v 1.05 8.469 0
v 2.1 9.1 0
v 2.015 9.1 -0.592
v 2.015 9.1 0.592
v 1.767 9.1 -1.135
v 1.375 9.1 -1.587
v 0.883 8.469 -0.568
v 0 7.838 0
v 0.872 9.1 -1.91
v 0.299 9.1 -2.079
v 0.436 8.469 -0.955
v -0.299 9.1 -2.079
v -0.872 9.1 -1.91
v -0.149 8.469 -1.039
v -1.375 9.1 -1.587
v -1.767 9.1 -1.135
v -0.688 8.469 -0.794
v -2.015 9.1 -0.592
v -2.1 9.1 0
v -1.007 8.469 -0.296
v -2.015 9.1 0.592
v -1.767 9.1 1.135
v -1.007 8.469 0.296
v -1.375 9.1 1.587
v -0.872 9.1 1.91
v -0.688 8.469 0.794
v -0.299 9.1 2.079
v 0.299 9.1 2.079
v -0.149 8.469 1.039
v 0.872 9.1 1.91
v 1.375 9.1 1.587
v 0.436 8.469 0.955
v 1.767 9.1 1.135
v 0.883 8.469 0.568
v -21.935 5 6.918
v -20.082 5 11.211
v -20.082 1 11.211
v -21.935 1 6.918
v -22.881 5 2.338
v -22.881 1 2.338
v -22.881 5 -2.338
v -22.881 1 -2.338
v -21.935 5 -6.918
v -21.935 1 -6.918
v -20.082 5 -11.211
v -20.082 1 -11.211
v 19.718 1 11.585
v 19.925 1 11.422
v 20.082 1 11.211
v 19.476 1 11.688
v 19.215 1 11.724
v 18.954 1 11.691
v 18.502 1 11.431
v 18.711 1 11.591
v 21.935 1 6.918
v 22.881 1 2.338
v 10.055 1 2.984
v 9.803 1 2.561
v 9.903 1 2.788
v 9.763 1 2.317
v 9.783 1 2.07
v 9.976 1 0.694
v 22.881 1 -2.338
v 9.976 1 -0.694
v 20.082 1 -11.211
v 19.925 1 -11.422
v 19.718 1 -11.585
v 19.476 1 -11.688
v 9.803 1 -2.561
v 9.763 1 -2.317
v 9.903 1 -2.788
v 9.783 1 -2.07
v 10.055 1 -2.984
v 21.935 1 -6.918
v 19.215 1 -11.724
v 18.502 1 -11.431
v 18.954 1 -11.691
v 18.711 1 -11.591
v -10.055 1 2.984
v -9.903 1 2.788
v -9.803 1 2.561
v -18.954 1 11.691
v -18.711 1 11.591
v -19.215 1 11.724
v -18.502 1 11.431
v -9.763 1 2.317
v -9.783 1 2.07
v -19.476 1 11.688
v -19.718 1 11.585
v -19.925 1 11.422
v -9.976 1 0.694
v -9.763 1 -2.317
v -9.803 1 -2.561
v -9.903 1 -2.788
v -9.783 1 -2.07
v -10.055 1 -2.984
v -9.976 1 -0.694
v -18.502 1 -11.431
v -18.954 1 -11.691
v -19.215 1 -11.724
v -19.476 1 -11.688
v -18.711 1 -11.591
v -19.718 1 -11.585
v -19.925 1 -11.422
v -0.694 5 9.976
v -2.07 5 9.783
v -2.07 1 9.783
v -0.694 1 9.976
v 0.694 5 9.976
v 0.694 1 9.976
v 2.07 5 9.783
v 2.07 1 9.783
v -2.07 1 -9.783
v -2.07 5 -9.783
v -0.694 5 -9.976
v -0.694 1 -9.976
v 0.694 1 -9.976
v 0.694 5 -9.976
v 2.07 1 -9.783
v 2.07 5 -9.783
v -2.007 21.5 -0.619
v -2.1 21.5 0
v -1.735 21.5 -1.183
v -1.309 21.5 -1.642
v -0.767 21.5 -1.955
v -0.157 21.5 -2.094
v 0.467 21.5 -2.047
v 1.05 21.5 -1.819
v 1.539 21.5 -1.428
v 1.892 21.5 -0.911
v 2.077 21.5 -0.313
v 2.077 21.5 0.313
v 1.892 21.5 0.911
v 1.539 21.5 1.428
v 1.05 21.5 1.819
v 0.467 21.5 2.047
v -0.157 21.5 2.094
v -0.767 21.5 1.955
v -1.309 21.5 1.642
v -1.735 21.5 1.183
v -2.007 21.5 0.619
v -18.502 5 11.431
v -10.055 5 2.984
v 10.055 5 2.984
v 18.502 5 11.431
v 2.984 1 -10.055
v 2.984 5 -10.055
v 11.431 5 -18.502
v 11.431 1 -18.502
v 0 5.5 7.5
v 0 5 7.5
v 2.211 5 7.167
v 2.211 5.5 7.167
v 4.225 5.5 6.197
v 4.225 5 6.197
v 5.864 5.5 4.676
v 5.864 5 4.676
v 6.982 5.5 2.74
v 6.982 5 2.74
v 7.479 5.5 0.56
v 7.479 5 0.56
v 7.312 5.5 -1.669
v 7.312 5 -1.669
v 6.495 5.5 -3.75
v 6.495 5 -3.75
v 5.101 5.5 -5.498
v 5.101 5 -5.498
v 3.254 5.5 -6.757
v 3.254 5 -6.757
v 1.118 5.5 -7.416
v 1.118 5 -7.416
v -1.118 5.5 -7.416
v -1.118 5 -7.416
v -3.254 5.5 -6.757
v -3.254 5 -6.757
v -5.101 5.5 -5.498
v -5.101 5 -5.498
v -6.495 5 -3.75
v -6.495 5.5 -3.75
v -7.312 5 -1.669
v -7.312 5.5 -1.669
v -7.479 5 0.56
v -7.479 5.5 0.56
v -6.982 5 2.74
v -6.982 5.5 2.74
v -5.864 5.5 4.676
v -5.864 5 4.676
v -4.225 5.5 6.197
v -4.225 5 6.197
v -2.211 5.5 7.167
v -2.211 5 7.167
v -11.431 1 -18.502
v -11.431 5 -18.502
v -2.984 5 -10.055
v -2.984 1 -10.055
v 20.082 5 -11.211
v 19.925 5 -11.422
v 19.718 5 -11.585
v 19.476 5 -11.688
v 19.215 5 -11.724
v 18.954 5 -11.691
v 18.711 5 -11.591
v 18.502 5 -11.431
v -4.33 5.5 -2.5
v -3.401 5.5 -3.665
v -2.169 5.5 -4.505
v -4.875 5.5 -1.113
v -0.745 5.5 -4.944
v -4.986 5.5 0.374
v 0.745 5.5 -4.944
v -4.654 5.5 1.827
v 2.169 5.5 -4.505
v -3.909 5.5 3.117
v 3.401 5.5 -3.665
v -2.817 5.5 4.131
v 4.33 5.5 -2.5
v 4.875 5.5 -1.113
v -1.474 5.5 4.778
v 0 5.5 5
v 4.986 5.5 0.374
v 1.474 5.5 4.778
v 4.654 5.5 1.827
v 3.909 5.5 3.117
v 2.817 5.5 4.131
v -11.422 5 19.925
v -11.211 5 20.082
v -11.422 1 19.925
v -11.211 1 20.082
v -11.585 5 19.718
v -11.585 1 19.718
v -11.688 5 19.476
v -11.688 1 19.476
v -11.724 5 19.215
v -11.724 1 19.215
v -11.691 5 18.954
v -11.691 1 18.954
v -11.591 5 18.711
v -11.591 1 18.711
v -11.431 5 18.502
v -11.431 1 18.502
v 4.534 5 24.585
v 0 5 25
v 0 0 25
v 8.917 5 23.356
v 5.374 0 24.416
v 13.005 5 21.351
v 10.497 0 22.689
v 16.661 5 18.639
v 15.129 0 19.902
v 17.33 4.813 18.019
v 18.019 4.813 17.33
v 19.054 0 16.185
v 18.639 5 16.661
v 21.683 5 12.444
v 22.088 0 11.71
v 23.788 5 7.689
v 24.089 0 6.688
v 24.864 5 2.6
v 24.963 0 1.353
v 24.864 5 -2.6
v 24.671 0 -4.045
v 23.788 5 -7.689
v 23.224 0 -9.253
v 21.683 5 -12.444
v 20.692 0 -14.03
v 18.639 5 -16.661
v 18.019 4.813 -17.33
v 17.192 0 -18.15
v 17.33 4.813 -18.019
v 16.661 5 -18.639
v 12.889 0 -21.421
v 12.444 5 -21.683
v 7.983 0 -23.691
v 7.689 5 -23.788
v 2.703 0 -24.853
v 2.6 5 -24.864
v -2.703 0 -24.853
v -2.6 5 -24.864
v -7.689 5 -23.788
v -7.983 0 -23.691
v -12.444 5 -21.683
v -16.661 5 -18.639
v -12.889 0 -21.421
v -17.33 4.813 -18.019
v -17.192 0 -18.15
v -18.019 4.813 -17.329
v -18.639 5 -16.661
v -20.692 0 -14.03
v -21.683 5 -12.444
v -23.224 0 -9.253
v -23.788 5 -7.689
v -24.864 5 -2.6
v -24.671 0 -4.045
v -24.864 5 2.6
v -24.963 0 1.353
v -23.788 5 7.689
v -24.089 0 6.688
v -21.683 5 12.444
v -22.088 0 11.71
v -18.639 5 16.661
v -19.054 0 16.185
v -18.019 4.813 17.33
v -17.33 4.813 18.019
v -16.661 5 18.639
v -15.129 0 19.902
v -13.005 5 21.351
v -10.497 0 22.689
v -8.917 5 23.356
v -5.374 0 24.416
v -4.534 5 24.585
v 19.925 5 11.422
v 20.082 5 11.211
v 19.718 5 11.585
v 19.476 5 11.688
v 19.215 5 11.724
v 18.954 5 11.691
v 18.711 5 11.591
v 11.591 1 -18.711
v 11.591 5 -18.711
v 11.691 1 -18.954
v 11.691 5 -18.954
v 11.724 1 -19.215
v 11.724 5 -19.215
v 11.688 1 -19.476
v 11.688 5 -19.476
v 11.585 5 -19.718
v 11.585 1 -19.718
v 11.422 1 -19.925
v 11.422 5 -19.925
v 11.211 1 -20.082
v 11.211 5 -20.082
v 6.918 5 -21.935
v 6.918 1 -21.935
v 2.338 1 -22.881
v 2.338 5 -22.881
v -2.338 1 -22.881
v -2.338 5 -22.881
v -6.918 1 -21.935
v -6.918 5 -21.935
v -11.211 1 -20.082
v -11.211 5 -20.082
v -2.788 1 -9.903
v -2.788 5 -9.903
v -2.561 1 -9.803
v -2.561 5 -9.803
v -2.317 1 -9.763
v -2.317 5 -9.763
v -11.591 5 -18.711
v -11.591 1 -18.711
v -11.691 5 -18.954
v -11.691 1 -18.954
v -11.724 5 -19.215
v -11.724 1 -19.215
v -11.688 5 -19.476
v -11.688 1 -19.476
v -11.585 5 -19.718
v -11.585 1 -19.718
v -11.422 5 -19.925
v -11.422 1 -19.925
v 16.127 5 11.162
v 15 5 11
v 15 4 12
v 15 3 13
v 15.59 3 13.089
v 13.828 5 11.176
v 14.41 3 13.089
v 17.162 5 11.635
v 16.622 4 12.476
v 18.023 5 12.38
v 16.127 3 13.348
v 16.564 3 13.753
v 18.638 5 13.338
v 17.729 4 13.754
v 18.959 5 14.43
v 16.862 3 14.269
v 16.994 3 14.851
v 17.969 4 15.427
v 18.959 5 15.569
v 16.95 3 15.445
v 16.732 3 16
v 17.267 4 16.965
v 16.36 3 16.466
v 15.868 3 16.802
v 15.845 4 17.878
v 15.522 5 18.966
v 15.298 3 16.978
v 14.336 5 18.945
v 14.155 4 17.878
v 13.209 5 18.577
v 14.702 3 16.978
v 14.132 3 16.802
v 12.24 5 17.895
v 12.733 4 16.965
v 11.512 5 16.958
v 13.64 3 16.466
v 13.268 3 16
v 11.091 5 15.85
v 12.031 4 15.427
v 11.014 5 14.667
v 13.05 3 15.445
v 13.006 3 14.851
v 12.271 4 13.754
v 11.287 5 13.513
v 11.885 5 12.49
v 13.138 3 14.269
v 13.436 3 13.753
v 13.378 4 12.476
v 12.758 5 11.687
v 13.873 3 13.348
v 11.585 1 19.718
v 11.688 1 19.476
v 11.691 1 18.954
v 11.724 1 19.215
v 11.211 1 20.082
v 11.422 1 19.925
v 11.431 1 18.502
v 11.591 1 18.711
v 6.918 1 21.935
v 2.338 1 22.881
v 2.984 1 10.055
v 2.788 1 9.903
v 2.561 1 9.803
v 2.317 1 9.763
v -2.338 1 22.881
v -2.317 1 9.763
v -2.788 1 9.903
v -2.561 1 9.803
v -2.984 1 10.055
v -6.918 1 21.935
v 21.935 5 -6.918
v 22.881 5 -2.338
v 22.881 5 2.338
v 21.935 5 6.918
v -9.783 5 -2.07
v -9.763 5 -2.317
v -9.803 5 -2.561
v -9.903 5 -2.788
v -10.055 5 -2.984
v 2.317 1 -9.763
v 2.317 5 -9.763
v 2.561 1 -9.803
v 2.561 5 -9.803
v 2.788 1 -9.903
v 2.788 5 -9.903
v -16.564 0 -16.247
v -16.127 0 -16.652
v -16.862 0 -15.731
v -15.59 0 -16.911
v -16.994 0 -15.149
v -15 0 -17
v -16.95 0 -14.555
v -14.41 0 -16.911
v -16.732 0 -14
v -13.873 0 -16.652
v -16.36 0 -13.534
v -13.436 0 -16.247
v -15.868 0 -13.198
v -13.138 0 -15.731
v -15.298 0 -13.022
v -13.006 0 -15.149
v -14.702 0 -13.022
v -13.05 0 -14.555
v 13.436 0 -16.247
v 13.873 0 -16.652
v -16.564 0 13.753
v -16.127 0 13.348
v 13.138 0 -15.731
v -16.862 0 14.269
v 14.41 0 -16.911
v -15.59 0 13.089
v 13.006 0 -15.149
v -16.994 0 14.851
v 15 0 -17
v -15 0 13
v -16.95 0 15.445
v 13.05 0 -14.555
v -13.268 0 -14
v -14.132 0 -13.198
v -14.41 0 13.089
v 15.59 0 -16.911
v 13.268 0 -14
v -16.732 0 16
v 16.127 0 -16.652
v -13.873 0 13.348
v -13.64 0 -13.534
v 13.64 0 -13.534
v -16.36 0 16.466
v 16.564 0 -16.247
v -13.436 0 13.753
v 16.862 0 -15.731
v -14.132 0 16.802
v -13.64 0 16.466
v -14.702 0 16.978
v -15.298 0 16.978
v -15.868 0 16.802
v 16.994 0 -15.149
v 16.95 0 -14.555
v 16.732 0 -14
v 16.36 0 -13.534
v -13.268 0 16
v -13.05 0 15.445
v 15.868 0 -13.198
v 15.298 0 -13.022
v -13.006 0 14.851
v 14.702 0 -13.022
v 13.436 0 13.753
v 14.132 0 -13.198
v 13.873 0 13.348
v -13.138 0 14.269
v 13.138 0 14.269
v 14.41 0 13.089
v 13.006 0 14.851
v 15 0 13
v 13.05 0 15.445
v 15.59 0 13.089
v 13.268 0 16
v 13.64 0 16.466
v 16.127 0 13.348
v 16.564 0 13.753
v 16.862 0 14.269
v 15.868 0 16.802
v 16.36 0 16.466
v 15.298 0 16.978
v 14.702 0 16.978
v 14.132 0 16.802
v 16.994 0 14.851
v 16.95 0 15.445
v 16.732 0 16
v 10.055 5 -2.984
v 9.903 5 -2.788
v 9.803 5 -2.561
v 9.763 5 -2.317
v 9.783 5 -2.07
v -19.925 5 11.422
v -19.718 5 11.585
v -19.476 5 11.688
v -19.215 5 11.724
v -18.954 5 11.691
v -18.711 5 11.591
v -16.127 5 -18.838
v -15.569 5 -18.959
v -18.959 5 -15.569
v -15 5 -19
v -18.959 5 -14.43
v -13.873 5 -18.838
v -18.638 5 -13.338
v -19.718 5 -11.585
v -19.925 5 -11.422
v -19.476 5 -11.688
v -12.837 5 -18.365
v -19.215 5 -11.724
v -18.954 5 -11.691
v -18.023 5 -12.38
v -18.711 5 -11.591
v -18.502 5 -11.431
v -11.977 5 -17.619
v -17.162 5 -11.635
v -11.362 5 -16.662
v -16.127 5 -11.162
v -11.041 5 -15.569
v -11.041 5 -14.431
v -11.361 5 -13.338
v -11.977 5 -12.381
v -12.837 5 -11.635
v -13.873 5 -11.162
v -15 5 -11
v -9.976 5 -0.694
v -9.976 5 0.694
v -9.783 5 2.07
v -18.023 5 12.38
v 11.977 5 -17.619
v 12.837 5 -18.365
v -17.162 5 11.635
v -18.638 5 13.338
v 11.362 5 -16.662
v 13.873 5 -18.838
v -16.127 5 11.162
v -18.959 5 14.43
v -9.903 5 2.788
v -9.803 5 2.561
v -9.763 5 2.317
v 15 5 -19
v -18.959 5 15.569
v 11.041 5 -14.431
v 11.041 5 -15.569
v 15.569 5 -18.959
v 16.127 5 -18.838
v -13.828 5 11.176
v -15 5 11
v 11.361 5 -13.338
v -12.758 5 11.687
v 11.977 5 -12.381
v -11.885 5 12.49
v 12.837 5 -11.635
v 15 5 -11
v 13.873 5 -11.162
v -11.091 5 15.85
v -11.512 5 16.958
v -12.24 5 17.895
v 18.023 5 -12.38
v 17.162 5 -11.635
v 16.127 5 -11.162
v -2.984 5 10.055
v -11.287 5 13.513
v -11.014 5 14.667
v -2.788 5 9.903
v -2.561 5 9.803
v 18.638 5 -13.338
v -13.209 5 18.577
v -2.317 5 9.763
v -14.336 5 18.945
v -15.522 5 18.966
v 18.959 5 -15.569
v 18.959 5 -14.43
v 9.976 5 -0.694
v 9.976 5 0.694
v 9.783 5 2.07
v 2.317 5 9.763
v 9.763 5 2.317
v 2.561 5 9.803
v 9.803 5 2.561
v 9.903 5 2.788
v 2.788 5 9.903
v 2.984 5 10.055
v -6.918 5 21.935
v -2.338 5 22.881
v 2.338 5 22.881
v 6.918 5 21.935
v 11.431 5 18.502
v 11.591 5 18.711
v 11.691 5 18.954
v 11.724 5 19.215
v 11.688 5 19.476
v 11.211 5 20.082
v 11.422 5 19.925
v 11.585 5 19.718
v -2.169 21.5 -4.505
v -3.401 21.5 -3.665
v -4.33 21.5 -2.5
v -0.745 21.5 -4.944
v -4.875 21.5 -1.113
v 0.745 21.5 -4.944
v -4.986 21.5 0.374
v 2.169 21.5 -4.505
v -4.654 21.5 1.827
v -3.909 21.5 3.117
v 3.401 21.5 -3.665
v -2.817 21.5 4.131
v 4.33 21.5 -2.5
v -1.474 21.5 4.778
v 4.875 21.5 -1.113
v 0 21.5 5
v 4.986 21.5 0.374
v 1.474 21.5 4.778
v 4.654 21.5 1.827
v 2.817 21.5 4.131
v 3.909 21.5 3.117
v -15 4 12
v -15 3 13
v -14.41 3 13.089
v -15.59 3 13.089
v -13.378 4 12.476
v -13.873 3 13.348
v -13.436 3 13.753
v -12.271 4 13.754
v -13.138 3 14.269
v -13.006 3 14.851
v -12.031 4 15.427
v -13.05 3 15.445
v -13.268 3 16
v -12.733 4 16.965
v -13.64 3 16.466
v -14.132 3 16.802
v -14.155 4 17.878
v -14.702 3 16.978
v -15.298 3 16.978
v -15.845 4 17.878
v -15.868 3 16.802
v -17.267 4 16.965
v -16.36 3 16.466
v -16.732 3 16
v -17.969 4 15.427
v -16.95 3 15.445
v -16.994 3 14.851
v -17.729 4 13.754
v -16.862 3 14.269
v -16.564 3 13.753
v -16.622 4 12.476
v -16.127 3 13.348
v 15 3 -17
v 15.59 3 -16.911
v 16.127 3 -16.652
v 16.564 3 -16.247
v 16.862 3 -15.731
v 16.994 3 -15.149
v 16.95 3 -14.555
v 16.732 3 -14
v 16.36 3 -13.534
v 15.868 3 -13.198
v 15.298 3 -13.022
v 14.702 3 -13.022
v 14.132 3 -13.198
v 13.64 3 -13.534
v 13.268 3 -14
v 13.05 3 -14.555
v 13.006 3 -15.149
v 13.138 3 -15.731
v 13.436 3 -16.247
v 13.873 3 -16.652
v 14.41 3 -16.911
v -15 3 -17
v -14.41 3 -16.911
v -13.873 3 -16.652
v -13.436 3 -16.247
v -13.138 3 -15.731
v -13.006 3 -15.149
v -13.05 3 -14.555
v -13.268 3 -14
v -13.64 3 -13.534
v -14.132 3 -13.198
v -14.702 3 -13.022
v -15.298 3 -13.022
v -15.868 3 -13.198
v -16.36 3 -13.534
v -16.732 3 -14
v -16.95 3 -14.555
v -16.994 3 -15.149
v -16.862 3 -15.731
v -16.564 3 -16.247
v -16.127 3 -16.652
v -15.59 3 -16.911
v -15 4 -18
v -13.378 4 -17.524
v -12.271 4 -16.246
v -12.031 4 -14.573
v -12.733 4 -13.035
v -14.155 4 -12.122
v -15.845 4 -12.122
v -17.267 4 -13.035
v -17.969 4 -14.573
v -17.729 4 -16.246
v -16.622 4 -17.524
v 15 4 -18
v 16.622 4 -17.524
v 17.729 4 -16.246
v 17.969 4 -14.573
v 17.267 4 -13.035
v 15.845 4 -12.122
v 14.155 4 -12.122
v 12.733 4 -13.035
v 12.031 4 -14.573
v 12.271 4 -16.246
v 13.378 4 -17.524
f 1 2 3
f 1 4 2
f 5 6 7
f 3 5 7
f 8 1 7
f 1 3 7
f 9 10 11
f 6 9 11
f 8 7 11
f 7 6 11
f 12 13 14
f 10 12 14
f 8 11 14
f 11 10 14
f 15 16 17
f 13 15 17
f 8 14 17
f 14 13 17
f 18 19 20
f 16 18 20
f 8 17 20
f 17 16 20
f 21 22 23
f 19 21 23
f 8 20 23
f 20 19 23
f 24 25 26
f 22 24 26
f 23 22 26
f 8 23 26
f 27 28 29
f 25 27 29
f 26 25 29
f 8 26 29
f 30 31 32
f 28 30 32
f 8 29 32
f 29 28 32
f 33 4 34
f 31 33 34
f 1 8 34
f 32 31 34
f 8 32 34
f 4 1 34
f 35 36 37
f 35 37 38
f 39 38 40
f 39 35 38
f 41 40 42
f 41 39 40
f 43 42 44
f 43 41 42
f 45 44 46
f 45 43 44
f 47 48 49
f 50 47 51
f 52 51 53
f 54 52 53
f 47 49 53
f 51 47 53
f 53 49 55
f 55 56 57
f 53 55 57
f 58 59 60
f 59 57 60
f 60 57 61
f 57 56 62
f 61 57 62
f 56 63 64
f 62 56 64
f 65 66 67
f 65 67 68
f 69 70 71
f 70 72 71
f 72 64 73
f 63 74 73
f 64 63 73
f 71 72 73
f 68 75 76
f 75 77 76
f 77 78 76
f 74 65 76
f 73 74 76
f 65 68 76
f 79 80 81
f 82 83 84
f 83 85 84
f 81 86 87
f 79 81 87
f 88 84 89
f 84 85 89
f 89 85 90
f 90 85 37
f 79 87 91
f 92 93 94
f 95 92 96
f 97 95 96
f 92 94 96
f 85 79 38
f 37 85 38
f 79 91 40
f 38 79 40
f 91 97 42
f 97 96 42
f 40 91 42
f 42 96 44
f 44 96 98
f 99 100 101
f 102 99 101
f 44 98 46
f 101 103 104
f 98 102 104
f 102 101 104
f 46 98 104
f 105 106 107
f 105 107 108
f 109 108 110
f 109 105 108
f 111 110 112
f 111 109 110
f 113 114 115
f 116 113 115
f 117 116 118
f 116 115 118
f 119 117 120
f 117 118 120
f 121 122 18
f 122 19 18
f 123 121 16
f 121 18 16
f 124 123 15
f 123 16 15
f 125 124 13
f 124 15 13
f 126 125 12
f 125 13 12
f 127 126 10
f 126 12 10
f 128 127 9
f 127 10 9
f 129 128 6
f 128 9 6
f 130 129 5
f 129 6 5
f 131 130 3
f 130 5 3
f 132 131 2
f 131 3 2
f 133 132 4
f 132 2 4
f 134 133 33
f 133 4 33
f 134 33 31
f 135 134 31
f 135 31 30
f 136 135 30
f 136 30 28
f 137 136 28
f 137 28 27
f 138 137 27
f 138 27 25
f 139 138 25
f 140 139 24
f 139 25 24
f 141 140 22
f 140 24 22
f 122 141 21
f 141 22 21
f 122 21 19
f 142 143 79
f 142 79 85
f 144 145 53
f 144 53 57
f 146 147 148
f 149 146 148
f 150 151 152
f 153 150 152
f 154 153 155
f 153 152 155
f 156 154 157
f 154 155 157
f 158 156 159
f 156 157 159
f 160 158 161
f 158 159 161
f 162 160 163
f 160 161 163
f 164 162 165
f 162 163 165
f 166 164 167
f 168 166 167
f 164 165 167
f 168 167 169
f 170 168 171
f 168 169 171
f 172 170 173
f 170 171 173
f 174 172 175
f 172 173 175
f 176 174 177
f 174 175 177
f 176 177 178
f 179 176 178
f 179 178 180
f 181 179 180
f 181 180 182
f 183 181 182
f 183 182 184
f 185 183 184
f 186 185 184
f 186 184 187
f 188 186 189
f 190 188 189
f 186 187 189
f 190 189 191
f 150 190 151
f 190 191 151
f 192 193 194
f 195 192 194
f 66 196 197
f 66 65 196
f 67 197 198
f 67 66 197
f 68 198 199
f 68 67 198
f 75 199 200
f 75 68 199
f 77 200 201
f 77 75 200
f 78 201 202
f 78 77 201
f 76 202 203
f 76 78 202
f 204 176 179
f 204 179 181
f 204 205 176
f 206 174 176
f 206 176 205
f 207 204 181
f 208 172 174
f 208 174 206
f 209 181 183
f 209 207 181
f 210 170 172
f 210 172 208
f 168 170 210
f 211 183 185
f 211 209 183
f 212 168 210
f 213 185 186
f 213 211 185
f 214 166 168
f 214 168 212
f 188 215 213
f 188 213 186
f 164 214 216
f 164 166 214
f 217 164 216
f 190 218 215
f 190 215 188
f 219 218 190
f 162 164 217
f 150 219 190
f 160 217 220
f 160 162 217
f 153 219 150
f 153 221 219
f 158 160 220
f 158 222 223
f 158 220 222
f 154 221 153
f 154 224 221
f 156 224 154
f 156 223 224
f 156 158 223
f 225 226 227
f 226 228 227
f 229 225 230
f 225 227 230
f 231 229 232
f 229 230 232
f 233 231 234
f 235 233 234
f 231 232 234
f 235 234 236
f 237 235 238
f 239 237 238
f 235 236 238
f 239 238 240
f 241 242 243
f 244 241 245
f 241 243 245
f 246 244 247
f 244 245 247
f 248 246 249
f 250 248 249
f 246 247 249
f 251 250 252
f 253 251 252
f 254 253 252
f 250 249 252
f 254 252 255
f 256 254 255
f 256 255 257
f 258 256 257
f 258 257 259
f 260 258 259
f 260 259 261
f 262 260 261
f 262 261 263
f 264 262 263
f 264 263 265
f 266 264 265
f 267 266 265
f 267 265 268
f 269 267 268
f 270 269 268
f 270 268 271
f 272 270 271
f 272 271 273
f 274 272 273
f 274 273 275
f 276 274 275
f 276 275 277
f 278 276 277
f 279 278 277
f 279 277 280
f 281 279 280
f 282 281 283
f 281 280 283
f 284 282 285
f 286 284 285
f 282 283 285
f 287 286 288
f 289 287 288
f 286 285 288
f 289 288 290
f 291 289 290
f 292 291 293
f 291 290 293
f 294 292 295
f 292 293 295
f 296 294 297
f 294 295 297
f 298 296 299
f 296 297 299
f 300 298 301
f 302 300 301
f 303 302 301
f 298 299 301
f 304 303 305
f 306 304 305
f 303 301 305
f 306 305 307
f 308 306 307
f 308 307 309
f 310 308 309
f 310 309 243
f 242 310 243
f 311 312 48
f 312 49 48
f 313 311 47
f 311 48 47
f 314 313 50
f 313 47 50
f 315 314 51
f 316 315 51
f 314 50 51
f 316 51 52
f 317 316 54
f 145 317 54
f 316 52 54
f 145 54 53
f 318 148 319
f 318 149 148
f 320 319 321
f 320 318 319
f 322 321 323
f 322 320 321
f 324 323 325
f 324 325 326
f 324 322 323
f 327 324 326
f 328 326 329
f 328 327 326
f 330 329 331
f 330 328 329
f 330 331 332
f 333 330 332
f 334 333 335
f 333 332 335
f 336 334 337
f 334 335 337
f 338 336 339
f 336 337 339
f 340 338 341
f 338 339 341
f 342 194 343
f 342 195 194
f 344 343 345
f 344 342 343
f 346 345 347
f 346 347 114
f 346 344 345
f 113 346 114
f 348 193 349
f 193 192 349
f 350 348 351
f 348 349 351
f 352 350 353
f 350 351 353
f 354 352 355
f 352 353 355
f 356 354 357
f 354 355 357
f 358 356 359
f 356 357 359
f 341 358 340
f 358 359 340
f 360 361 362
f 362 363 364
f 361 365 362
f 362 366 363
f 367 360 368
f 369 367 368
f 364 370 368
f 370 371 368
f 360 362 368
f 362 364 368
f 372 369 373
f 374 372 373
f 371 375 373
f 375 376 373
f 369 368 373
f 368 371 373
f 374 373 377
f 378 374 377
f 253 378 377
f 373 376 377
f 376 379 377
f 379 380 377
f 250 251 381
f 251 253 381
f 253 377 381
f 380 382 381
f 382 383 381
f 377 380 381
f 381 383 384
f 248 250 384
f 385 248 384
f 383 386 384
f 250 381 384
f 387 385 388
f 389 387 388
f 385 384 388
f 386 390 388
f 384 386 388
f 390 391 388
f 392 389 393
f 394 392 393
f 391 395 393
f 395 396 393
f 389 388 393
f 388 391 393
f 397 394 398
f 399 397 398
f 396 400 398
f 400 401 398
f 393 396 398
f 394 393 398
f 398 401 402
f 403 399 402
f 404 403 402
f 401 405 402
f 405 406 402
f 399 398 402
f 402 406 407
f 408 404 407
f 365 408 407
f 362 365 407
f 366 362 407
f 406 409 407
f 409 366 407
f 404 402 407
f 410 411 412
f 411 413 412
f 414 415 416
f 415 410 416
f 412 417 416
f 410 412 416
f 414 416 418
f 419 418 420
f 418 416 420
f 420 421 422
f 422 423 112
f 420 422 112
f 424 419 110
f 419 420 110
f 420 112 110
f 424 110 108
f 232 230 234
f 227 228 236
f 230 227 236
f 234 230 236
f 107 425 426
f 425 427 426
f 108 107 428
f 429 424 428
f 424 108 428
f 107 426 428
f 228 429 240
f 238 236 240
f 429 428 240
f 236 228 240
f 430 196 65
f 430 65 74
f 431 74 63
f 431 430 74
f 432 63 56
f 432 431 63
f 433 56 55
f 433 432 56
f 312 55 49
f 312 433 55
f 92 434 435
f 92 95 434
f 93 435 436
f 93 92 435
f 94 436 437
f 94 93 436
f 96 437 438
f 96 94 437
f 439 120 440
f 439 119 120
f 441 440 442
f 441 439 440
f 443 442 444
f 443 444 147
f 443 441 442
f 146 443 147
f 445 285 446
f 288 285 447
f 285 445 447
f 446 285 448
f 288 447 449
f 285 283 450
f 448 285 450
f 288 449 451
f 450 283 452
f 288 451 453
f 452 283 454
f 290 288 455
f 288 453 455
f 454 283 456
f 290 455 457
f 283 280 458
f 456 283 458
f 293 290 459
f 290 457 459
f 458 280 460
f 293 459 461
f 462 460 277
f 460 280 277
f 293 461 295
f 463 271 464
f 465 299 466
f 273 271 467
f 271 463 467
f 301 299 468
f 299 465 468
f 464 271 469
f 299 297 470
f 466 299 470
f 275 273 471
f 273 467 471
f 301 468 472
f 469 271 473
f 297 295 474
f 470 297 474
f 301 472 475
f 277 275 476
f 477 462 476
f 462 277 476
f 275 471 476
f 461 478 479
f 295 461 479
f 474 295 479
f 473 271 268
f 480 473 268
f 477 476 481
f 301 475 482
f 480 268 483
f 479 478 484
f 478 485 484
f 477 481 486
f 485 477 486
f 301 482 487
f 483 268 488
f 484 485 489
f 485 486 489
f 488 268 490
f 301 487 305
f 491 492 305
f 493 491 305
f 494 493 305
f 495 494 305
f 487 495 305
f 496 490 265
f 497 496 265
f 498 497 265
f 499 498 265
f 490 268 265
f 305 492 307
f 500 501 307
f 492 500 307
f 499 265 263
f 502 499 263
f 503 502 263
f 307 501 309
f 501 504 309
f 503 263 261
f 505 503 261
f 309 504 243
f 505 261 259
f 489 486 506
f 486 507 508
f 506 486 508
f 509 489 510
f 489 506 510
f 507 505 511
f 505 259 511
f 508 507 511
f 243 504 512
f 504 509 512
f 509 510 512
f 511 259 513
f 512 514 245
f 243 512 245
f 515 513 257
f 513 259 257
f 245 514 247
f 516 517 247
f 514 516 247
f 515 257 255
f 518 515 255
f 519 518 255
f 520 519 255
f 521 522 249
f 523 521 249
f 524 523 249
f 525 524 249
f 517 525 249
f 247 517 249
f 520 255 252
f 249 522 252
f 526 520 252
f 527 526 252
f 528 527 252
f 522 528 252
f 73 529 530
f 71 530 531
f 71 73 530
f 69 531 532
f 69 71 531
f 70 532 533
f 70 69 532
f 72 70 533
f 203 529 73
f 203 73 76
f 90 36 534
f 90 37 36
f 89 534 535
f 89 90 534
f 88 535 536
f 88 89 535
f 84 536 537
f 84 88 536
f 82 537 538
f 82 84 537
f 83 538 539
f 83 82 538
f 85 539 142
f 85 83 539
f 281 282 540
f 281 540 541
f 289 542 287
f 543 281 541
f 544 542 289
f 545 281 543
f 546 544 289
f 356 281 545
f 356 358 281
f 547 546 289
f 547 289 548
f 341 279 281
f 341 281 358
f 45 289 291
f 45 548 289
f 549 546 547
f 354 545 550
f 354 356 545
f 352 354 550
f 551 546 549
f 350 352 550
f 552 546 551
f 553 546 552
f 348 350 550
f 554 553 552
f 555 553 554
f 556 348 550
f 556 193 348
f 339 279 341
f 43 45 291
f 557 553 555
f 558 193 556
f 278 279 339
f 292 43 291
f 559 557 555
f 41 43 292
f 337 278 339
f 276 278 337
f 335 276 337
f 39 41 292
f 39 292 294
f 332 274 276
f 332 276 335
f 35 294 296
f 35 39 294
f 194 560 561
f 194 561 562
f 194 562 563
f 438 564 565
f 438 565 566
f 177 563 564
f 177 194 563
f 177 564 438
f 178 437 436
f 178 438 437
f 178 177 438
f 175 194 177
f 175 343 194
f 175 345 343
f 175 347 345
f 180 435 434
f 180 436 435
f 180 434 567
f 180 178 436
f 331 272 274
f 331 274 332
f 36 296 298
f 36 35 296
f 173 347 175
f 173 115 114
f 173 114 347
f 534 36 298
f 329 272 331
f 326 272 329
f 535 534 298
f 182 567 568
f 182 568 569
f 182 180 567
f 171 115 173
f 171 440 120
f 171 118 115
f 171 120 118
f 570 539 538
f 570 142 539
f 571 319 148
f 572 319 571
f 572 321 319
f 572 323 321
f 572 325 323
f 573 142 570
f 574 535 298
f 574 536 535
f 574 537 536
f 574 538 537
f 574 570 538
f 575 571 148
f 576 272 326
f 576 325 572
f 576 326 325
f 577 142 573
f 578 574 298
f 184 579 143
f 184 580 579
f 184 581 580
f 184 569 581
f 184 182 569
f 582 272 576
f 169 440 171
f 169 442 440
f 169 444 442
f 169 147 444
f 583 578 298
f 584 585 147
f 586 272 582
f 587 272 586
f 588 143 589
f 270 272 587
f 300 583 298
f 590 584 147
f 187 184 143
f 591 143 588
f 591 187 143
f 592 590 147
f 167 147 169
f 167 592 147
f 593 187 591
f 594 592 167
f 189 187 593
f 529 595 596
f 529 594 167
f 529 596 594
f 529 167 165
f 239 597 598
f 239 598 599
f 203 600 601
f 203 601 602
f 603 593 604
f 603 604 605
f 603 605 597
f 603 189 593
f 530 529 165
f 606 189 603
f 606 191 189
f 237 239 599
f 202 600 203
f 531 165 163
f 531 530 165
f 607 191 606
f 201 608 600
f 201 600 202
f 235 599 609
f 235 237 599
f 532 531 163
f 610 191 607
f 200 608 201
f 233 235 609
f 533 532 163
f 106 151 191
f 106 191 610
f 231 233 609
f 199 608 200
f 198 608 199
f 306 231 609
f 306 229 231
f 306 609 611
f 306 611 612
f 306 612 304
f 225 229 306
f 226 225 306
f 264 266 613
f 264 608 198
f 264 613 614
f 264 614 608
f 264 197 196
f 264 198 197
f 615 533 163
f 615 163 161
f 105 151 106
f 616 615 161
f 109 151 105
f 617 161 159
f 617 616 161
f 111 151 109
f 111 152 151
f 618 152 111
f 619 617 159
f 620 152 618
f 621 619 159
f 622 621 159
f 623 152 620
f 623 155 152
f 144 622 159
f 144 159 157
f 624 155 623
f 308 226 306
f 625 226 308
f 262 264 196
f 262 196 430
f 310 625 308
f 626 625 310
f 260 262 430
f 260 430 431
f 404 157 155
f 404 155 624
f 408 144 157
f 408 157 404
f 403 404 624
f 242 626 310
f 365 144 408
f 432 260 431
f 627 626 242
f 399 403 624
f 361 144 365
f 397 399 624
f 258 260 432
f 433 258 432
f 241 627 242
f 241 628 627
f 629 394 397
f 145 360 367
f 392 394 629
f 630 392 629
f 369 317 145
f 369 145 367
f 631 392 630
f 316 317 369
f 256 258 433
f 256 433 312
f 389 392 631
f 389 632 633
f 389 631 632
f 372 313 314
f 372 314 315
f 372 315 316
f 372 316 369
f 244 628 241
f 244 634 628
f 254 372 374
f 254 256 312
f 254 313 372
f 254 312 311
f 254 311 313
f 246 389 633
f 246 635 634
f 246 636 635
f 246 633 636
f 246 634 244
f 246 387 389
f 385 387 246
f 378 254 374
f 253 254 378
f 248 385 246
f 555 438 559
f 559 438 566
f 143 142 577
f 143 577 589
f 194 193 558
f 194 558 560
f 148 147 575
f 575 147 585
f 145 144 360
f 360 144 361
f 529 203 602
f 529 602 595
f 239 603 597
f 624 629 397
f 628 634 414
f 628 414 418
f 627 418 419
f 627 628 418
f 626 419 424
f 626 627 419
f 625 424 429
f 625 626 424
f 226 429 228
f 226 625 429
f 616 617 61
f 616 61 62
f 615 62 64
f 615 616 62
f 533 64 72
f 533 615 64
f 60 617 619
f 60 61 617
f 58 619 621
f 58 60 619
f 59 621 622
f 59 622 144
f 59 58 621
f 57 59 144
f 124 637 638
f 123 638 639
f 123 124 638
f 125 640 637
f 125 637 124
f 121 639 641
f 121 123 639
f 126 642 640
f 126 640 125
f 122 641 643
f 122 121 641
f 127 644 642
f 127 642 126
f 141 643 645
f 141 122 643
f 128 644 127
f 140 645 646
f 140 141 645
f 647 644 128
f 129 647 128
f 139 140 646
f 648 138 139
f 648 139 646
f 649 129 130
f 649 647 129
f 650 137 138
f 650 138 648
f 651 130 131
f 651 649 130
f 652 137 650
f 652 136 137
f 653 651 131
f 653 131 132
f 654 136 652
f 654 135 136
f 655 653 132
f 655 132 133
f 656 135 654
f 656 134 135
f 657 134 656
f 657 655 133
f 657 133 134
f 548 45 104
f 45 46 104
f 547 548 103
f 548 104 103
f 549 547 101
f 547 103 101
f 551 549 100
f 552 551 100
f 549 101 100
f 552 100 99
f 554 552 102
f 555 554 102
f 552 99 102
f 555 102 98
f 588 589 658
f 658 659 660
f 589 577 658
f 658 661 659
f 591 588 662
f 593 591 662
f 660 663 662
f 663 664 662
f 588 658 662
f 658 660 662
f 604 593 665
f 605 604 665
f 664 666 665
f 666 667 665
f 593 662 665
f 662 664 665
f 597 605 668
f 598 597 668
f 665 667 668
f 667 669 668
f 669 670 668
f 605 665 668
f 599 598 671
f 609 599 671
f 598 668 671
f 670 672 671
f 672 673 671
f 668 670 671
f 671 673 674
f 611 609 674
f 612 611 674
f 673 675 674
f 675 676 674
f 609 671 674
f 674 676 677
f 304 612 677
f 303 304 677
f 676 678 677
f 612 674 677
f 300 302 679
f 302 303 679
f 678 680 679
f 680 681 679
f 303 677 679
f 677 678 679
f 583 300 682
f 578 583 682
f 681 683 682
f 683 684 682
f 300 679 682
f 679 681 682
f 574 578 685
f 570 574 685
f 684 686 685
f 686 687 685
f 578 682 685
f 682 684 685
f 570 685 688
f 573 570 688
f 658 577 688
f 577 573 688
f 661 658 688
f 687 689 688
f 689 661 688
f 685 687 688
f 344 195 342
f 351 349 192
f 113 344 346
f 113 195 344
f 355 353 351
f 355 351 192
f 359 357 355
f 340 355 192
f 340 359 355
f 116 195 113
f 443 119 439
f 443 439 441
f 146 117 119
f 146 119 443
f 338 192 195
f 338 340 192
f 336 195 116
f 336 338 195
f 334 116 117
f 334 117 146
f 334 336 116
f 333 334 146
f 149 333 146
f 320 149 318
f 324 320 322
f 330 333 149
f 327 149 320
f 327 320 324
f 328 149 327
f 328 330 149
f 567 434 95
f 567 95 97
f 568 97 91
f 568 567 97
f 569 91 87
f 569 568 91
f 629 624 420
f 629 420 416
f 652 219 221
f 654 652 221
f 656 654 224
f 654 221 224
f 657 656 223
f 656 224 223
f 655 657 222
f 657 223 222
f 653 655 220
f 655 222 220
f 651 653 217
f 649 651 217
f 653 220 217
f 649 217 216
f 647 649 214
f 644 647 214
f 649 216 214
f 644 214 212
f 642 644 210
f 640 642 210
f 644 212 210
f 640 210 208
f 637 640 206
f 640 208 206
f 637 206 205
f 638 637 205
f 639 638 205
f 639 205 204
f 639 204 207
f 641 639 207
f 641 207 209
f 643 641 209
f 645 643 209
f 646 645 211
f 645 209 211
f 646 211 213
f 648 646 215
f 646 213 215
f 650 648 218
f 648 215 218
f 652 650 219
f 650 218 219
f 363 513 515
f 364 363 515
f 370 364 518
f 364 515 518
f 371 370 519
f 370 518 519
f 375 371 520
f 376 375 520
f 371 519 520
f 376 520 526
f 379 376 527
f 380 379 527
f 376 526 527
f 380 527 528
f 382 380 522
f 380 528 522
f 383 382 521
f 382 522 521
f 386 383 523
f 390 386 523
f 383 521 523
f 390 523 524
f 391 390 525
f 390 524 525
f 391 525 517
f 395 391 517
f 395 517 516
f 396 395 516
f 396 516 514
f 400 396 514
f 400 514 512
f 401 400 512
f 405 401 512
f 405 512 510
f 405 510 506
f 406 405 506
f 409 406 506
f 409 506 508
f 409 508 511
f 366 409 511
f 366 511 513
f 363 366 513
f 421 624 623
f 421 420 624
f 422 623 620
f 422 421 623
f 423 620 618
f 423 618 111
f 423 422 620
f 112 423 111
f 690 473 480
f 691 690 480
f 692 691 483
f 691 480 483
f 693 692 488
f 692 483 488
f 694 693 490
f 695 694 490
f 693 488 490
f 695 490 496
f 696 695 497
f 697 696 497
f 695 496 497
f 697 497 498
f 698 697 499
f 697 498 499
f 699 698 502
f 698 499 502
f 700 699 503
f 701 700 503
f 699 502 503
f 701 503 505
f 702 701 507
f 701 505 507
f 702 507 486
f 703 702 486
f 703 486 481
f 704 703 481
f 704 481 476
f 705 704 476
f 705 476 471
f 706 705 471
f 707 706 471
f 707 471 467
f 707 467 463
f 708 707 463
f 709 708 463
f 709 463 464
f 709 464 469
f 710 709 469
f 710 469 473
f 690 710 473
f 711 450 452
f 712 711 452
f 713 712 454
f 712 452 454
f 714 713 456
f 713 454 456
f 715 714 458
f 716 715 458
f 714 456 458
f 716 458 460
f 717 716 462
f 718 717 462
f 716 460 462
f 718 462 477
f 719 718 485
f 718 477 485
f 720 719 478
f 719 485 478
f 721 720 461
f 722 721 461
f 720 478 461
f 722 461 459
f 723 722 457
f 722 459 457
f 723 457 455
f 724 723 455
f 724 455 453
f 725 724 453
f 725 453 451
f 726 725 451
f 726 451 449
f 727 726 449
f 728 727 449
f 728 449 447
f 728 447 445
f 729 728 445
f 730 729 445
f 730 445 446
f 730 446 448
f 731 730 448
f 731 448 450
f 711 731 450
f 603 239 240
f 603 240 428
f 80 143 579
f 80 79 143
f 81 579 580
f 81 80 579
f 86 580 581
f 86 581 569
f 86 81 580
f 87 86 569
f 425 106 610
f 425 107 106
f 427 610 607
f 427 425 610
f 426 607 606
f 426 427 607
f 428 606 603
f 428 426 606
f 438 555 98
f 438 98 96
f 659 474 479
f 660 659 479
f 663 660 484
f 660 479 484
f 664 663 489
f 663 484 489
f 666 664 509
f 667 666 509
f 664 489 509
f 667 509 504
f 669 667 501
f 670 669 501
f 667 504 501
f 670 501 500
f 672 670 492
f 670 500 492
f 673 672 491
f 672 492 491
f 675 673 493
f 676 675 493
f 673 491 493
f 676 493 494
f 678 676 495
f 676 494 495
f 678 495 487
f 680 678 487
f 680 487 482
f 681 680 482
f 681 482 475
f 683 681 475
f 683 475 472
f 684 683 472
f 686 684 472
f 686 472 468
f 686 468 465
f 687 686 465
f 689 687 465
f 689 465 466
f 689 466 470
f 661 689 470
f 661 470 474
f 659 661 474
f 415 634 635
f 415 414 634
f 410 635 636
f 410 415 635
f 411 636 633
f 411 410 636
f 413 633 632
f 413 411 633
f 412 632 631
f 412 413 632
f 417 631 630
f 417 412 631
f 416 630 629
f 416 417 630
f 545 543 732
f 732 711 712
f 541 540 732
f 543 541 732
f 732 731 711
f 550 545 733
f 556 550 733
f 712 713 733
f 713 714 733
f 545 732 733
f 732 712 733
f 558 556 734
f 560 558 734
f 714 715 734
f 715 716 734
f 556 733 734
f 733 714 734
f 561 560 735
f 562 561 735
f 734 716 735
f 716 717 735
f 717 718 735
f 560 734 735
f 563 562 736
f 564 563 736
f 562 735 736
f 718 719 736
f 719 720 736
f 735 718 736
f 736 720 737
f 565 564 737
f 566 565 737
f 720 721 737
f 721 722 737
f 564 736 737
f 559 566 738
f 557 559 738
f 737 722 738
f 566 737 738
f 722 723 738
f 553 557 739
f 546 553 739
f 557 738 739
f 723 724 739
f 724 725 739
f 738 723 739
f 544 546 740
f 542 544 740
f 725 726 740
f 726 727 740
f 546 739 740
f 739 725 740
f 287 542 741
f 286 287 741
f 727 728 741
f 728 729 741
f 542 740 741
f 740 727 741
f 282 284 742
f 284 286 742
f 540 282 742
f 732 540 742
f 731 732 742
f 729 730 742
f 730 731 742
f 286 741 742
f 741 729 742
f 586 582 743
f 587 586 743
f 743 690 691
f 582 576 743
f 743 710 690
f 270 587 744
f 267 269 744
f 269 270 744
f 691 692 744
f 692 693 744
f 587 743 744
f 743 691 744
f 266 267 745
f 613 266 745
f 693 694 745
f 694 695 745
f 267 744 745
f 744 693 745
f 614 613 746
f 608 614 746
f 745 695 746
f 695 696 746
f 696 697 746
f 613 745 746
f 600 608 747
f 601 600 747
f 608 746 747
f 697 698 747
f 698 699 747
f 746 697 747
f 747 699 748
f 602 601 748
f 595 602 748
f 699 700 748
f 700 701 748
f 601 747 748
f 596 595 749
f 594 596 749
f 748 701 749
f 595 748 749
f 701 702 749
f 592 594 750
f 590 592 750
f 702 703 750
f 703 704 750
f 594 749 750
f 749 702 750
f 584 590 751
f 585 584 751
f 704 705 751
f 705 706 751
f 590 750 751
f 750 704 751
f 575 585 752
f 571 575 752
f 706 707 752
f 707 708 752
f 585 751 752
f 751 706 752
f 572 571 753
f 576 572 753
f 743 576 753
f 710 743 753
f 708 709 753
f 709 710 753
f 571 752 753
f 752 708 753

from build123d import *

# Parameters (mm, degrees)
SKETCH_1_R             = 25
EXTRUDE_1_DEPTH        = 5
SKETCH_3_R             = 7.5
EXTRUDE_2_DEPTH        = 0.5
SKETCH_4_R             = 5
EXTRUDE_3_DEPTH        = 16
SKETCH_8_R             = 2
CUT_EXTRUDE_2_DEPTH    = 42.379342672
CHAMFER_1_SIZE         = 2
CUT_EXTRUDE_5_DEPTH    = 4
FILLET_1_R             = 1
HOLE_WIZARD_M5_1_D     = 4.2
HOLE_WIZARD_M5_1_DEPTH = 12.4
HOLE_WIZARD_M5_1_TIP   = 1.2618073


with BuildPart() as part:
    # 草图1 → 凸台-拉伸1 (new body)
    with BuildSketch(Plane(origin=(0, 0, 0), x_dir=(1, 0, 0), z_dir=(0, 1, 0))):
        with Locations(Location((0, 0, 0), (0, 0, 270))):
            Circle(SKETCH_1_R)
    extrude(amount=EXTRUDE_1_DEPTH)

    # 草图3 → 凸台-拉伸2 (add)
    with BuildSketch(Plane(origin=(0, 5, 0), x_dir=(1, 0, 0), z_dir=(0, 1, 0))):
        with Locations(Location((0, 0, 0), (0, 0, 270))):
            Circle(SKETCH_3_R)
    extrude(amount=EXTRUDE_2_DEPTH)

    # 草图4 → 凸台-拉伸3 (add)
    with BuildSketch(Plane(origin=(0, 5.5, 0), x_dir=(1, 0, 0), z_dir=(0, 1, 0))):
        with Locations(Location((0, 0, 0), (0, 0, 270))):
            Circle(SKETCH_4_R)
    extrude(amount=EXTRUDE_3_DEPTH)

    # 草图8 → 切除-拉伸2 (cut, through all)
    with BuildSketch(Plane(origin=(0, 0, 0), x_dir=(-1, 0, 0), z_dir=(0, -1, 0))):
        with Locations(Location((-15, -15, 0), (0, 0, 90))):
            Circle(SKETCH_8_R)
        with Locations(Location((15, -15, 0), (0, 0, 90))):
            Circle(SKETCH_8_R)
        with Locations(Location((15, 15, 0), (0, 0, 90))):
            Circle(SKETCH_8_R)
        with Locations(Location((-15, 15, 0), (0, 0, 90))):
            Circle(SKETCH_8_R)
    extrude(amount=-CUT_EXTRUDE_2_DEPTH, mode=Mode.SUBTRACT)

    # 倒角1
    # the kernel refuses this chamfer: 2 mm, written as the material it takes off along each edge
    with BuildSketch(Plane(origin=(15, 5, -15), x_dir=(0, 0, -1), z_dir=(-1, 0, 0))) as chamfer_1_piece_1:
        Polygon((2 + CHAMFER_1_SIZE, 0), (2, CHAMFER_1_SIZE), (2, 0), align=None)
    revolve(axis=Axis((15, 5, -15), (0, -1, 0)), mode=Mode.SUBTRACT)
    with BuildSketch(Plane(origin=(-15, 5, -15), x_dir=(0, 0, -1), z_dir=(-1, 0, 0))) as chamfer_1_piece_2:
        Polygon((2 + CHAMFER_1_SIZE, 0), (2, CHAMFER_1_SIZE), (2, 0), align=None)
    revolve(axis=Axis((-15, 5, -15), (0, -1, 0)), mode=Mode.SUBTRACT)
    with BuildSketch(Plane(origin=(-15, 5, 15), x_dir=(0, 0, -1), z_dir=(-1, 0, 0))) as chamfer_1_piece_3:
        Polygon((2 + CHAMFER_1_SIZE, 0), (2, CHAMFER_1_SIZE), (2, 0), align=None)
    revolve(axis=Axis((-15, 5, 15), (0, -1, 0)), mode=Mode.SUBTRACT)
    with BuildSketch(Plane(origin=(15, 5, 15), x_dir=(0, 0, -1), z_dir=(-1, 0, 0))) as chamfer_1_piece_4:
        Polygon((2 + CHAMFER_1_SIZE, 0), (2, CHAMFER_1_SIZE), (2, 0), align=None)
    revolve(axis=Axis((15, 5, 15), (0, -1, 0)), mode=Mode.SUBTRACT)

    # 草图13 → 切除-拉伸5 (cut)
    with BuildSketch(Plane(origin=(0, 5, 0), x_dir=(1, 0, 0), z_dir=(0, 1, 0))):
        with BuildLine():
            Line((-12.33897396, 19.410041772), (-2.588190451, 9.659258263))
            ThreePointArc((-2.588190451, 9.659258263), (0, 10), (2.588190451, 9.659258263))
            Line((2.588190451, 9.659258263), (12.33897396, 19.410041772))
            ThreePointArc((12.33897396, 19.410041772), (0, 23), (-12.33897396, 19.410041772))
        make_face()
        with BuildLine():
            Line((19.410041772, -12.33897396), (9.659258263, -2.588190451))
            ThreePointArc((9.659258263, -2.588190451), (10, 0), (9.659258263, 2.588190451))
            Line((9.659258263, 2.588190451), (19.410041772, 12.33897396))
            ThreePointArc((19.410041772, 12.33897396), (23, 0), (19.410041772, -12.33897396))
        make_face()
        with BuildLine():
            Line((-12.33897396, -19.410041772), (-2.588190451, -9.659258263))
            ThreePointArc((-2.588190451, -9.659258263), (0, -10), (2.588190451, -9.659258263))
            Line((2.588190451, -9.659258263), (12.33897396, -19.410041772))
            ThreePointArc((12.33897396, -19.410041772), (0, -23), (-12.33897396, -19.410041772))
        make_face()
        with BuildLine():
            Line((-19.410041772, 12.33897396), (-9.659258263, 2.588190451))
            ThreePointArc((-9.659258263, 2.588190451), (-10, 0), (-9.659258263, -2.588190451))
            Line((-9.659258263, -2.588190451), (-19.410041772, -12.33897396))
            ThreePointArc((-19.410041772, -12.33897396), (-23, 0), (-19.410041772, 12.33897396))
        make_face()
    extrude(amount=-CUT_EXTRUDE_5_DEPTH, mode=Mode.SUBTRACT)

    # 圆角1
    fillet_1_edges = [part.edges().sort_by_distance(p)[0] for p in [
        (12.33897396, 3, 19.410041772),
        (-12.33897396, 3, 19.410041772),
        (-2.588190451, 3, 9.659258263),
        (2.588190451, 3, 9.659258263),
        (19.410041772, 3, -12.33897396),
        (19.410041772, 3, 12.33897396),
        (9.659258263, 3, 2.588190451),
        (9.659258263, 3, -2.588190451),
        (-19.410041772, 3, 12.33897396),
        (-19.410041772, 3, -12.33897396),
        (-9.659258263, 3, -2.588190451),
        (-9.659258263, 3, 2.588190451),
        (-12.33897396, 3, -19.410041772),
        (12.33897396, 3, -19.410041772),
        (2.588190451, 3, -9.659258263),
        (-2.588190451, 3, -9.659258263),
    ]]
    fillet(fillet_1_edges, radius=FILLET_1_R)

    # M5 螺纹孔1
    with Locations(Plane(origin=(0, 21.5, 0), x_dir=(1, 0, 0), z_dir=(0, 1, 0))):
        with Locations((0, 0)):
            Hole(HOLE_WIZARD_M5_1_D / 2, depth=HOLE_WIZARD_M5_1_DEPTH)
            with Locations((0, 0, -(HOLE_WIZARD_M5_1_DEPTH + HOLE_WIZARD_M5_1_TIP / 2))):  # 118° drill point
                Cone(0, HOLE_WIZARD_M5_1_D / 2, HOLE_WIZARD_M5_1_TIP, mode=Mode.SUBTRACT)


solid = part.part
